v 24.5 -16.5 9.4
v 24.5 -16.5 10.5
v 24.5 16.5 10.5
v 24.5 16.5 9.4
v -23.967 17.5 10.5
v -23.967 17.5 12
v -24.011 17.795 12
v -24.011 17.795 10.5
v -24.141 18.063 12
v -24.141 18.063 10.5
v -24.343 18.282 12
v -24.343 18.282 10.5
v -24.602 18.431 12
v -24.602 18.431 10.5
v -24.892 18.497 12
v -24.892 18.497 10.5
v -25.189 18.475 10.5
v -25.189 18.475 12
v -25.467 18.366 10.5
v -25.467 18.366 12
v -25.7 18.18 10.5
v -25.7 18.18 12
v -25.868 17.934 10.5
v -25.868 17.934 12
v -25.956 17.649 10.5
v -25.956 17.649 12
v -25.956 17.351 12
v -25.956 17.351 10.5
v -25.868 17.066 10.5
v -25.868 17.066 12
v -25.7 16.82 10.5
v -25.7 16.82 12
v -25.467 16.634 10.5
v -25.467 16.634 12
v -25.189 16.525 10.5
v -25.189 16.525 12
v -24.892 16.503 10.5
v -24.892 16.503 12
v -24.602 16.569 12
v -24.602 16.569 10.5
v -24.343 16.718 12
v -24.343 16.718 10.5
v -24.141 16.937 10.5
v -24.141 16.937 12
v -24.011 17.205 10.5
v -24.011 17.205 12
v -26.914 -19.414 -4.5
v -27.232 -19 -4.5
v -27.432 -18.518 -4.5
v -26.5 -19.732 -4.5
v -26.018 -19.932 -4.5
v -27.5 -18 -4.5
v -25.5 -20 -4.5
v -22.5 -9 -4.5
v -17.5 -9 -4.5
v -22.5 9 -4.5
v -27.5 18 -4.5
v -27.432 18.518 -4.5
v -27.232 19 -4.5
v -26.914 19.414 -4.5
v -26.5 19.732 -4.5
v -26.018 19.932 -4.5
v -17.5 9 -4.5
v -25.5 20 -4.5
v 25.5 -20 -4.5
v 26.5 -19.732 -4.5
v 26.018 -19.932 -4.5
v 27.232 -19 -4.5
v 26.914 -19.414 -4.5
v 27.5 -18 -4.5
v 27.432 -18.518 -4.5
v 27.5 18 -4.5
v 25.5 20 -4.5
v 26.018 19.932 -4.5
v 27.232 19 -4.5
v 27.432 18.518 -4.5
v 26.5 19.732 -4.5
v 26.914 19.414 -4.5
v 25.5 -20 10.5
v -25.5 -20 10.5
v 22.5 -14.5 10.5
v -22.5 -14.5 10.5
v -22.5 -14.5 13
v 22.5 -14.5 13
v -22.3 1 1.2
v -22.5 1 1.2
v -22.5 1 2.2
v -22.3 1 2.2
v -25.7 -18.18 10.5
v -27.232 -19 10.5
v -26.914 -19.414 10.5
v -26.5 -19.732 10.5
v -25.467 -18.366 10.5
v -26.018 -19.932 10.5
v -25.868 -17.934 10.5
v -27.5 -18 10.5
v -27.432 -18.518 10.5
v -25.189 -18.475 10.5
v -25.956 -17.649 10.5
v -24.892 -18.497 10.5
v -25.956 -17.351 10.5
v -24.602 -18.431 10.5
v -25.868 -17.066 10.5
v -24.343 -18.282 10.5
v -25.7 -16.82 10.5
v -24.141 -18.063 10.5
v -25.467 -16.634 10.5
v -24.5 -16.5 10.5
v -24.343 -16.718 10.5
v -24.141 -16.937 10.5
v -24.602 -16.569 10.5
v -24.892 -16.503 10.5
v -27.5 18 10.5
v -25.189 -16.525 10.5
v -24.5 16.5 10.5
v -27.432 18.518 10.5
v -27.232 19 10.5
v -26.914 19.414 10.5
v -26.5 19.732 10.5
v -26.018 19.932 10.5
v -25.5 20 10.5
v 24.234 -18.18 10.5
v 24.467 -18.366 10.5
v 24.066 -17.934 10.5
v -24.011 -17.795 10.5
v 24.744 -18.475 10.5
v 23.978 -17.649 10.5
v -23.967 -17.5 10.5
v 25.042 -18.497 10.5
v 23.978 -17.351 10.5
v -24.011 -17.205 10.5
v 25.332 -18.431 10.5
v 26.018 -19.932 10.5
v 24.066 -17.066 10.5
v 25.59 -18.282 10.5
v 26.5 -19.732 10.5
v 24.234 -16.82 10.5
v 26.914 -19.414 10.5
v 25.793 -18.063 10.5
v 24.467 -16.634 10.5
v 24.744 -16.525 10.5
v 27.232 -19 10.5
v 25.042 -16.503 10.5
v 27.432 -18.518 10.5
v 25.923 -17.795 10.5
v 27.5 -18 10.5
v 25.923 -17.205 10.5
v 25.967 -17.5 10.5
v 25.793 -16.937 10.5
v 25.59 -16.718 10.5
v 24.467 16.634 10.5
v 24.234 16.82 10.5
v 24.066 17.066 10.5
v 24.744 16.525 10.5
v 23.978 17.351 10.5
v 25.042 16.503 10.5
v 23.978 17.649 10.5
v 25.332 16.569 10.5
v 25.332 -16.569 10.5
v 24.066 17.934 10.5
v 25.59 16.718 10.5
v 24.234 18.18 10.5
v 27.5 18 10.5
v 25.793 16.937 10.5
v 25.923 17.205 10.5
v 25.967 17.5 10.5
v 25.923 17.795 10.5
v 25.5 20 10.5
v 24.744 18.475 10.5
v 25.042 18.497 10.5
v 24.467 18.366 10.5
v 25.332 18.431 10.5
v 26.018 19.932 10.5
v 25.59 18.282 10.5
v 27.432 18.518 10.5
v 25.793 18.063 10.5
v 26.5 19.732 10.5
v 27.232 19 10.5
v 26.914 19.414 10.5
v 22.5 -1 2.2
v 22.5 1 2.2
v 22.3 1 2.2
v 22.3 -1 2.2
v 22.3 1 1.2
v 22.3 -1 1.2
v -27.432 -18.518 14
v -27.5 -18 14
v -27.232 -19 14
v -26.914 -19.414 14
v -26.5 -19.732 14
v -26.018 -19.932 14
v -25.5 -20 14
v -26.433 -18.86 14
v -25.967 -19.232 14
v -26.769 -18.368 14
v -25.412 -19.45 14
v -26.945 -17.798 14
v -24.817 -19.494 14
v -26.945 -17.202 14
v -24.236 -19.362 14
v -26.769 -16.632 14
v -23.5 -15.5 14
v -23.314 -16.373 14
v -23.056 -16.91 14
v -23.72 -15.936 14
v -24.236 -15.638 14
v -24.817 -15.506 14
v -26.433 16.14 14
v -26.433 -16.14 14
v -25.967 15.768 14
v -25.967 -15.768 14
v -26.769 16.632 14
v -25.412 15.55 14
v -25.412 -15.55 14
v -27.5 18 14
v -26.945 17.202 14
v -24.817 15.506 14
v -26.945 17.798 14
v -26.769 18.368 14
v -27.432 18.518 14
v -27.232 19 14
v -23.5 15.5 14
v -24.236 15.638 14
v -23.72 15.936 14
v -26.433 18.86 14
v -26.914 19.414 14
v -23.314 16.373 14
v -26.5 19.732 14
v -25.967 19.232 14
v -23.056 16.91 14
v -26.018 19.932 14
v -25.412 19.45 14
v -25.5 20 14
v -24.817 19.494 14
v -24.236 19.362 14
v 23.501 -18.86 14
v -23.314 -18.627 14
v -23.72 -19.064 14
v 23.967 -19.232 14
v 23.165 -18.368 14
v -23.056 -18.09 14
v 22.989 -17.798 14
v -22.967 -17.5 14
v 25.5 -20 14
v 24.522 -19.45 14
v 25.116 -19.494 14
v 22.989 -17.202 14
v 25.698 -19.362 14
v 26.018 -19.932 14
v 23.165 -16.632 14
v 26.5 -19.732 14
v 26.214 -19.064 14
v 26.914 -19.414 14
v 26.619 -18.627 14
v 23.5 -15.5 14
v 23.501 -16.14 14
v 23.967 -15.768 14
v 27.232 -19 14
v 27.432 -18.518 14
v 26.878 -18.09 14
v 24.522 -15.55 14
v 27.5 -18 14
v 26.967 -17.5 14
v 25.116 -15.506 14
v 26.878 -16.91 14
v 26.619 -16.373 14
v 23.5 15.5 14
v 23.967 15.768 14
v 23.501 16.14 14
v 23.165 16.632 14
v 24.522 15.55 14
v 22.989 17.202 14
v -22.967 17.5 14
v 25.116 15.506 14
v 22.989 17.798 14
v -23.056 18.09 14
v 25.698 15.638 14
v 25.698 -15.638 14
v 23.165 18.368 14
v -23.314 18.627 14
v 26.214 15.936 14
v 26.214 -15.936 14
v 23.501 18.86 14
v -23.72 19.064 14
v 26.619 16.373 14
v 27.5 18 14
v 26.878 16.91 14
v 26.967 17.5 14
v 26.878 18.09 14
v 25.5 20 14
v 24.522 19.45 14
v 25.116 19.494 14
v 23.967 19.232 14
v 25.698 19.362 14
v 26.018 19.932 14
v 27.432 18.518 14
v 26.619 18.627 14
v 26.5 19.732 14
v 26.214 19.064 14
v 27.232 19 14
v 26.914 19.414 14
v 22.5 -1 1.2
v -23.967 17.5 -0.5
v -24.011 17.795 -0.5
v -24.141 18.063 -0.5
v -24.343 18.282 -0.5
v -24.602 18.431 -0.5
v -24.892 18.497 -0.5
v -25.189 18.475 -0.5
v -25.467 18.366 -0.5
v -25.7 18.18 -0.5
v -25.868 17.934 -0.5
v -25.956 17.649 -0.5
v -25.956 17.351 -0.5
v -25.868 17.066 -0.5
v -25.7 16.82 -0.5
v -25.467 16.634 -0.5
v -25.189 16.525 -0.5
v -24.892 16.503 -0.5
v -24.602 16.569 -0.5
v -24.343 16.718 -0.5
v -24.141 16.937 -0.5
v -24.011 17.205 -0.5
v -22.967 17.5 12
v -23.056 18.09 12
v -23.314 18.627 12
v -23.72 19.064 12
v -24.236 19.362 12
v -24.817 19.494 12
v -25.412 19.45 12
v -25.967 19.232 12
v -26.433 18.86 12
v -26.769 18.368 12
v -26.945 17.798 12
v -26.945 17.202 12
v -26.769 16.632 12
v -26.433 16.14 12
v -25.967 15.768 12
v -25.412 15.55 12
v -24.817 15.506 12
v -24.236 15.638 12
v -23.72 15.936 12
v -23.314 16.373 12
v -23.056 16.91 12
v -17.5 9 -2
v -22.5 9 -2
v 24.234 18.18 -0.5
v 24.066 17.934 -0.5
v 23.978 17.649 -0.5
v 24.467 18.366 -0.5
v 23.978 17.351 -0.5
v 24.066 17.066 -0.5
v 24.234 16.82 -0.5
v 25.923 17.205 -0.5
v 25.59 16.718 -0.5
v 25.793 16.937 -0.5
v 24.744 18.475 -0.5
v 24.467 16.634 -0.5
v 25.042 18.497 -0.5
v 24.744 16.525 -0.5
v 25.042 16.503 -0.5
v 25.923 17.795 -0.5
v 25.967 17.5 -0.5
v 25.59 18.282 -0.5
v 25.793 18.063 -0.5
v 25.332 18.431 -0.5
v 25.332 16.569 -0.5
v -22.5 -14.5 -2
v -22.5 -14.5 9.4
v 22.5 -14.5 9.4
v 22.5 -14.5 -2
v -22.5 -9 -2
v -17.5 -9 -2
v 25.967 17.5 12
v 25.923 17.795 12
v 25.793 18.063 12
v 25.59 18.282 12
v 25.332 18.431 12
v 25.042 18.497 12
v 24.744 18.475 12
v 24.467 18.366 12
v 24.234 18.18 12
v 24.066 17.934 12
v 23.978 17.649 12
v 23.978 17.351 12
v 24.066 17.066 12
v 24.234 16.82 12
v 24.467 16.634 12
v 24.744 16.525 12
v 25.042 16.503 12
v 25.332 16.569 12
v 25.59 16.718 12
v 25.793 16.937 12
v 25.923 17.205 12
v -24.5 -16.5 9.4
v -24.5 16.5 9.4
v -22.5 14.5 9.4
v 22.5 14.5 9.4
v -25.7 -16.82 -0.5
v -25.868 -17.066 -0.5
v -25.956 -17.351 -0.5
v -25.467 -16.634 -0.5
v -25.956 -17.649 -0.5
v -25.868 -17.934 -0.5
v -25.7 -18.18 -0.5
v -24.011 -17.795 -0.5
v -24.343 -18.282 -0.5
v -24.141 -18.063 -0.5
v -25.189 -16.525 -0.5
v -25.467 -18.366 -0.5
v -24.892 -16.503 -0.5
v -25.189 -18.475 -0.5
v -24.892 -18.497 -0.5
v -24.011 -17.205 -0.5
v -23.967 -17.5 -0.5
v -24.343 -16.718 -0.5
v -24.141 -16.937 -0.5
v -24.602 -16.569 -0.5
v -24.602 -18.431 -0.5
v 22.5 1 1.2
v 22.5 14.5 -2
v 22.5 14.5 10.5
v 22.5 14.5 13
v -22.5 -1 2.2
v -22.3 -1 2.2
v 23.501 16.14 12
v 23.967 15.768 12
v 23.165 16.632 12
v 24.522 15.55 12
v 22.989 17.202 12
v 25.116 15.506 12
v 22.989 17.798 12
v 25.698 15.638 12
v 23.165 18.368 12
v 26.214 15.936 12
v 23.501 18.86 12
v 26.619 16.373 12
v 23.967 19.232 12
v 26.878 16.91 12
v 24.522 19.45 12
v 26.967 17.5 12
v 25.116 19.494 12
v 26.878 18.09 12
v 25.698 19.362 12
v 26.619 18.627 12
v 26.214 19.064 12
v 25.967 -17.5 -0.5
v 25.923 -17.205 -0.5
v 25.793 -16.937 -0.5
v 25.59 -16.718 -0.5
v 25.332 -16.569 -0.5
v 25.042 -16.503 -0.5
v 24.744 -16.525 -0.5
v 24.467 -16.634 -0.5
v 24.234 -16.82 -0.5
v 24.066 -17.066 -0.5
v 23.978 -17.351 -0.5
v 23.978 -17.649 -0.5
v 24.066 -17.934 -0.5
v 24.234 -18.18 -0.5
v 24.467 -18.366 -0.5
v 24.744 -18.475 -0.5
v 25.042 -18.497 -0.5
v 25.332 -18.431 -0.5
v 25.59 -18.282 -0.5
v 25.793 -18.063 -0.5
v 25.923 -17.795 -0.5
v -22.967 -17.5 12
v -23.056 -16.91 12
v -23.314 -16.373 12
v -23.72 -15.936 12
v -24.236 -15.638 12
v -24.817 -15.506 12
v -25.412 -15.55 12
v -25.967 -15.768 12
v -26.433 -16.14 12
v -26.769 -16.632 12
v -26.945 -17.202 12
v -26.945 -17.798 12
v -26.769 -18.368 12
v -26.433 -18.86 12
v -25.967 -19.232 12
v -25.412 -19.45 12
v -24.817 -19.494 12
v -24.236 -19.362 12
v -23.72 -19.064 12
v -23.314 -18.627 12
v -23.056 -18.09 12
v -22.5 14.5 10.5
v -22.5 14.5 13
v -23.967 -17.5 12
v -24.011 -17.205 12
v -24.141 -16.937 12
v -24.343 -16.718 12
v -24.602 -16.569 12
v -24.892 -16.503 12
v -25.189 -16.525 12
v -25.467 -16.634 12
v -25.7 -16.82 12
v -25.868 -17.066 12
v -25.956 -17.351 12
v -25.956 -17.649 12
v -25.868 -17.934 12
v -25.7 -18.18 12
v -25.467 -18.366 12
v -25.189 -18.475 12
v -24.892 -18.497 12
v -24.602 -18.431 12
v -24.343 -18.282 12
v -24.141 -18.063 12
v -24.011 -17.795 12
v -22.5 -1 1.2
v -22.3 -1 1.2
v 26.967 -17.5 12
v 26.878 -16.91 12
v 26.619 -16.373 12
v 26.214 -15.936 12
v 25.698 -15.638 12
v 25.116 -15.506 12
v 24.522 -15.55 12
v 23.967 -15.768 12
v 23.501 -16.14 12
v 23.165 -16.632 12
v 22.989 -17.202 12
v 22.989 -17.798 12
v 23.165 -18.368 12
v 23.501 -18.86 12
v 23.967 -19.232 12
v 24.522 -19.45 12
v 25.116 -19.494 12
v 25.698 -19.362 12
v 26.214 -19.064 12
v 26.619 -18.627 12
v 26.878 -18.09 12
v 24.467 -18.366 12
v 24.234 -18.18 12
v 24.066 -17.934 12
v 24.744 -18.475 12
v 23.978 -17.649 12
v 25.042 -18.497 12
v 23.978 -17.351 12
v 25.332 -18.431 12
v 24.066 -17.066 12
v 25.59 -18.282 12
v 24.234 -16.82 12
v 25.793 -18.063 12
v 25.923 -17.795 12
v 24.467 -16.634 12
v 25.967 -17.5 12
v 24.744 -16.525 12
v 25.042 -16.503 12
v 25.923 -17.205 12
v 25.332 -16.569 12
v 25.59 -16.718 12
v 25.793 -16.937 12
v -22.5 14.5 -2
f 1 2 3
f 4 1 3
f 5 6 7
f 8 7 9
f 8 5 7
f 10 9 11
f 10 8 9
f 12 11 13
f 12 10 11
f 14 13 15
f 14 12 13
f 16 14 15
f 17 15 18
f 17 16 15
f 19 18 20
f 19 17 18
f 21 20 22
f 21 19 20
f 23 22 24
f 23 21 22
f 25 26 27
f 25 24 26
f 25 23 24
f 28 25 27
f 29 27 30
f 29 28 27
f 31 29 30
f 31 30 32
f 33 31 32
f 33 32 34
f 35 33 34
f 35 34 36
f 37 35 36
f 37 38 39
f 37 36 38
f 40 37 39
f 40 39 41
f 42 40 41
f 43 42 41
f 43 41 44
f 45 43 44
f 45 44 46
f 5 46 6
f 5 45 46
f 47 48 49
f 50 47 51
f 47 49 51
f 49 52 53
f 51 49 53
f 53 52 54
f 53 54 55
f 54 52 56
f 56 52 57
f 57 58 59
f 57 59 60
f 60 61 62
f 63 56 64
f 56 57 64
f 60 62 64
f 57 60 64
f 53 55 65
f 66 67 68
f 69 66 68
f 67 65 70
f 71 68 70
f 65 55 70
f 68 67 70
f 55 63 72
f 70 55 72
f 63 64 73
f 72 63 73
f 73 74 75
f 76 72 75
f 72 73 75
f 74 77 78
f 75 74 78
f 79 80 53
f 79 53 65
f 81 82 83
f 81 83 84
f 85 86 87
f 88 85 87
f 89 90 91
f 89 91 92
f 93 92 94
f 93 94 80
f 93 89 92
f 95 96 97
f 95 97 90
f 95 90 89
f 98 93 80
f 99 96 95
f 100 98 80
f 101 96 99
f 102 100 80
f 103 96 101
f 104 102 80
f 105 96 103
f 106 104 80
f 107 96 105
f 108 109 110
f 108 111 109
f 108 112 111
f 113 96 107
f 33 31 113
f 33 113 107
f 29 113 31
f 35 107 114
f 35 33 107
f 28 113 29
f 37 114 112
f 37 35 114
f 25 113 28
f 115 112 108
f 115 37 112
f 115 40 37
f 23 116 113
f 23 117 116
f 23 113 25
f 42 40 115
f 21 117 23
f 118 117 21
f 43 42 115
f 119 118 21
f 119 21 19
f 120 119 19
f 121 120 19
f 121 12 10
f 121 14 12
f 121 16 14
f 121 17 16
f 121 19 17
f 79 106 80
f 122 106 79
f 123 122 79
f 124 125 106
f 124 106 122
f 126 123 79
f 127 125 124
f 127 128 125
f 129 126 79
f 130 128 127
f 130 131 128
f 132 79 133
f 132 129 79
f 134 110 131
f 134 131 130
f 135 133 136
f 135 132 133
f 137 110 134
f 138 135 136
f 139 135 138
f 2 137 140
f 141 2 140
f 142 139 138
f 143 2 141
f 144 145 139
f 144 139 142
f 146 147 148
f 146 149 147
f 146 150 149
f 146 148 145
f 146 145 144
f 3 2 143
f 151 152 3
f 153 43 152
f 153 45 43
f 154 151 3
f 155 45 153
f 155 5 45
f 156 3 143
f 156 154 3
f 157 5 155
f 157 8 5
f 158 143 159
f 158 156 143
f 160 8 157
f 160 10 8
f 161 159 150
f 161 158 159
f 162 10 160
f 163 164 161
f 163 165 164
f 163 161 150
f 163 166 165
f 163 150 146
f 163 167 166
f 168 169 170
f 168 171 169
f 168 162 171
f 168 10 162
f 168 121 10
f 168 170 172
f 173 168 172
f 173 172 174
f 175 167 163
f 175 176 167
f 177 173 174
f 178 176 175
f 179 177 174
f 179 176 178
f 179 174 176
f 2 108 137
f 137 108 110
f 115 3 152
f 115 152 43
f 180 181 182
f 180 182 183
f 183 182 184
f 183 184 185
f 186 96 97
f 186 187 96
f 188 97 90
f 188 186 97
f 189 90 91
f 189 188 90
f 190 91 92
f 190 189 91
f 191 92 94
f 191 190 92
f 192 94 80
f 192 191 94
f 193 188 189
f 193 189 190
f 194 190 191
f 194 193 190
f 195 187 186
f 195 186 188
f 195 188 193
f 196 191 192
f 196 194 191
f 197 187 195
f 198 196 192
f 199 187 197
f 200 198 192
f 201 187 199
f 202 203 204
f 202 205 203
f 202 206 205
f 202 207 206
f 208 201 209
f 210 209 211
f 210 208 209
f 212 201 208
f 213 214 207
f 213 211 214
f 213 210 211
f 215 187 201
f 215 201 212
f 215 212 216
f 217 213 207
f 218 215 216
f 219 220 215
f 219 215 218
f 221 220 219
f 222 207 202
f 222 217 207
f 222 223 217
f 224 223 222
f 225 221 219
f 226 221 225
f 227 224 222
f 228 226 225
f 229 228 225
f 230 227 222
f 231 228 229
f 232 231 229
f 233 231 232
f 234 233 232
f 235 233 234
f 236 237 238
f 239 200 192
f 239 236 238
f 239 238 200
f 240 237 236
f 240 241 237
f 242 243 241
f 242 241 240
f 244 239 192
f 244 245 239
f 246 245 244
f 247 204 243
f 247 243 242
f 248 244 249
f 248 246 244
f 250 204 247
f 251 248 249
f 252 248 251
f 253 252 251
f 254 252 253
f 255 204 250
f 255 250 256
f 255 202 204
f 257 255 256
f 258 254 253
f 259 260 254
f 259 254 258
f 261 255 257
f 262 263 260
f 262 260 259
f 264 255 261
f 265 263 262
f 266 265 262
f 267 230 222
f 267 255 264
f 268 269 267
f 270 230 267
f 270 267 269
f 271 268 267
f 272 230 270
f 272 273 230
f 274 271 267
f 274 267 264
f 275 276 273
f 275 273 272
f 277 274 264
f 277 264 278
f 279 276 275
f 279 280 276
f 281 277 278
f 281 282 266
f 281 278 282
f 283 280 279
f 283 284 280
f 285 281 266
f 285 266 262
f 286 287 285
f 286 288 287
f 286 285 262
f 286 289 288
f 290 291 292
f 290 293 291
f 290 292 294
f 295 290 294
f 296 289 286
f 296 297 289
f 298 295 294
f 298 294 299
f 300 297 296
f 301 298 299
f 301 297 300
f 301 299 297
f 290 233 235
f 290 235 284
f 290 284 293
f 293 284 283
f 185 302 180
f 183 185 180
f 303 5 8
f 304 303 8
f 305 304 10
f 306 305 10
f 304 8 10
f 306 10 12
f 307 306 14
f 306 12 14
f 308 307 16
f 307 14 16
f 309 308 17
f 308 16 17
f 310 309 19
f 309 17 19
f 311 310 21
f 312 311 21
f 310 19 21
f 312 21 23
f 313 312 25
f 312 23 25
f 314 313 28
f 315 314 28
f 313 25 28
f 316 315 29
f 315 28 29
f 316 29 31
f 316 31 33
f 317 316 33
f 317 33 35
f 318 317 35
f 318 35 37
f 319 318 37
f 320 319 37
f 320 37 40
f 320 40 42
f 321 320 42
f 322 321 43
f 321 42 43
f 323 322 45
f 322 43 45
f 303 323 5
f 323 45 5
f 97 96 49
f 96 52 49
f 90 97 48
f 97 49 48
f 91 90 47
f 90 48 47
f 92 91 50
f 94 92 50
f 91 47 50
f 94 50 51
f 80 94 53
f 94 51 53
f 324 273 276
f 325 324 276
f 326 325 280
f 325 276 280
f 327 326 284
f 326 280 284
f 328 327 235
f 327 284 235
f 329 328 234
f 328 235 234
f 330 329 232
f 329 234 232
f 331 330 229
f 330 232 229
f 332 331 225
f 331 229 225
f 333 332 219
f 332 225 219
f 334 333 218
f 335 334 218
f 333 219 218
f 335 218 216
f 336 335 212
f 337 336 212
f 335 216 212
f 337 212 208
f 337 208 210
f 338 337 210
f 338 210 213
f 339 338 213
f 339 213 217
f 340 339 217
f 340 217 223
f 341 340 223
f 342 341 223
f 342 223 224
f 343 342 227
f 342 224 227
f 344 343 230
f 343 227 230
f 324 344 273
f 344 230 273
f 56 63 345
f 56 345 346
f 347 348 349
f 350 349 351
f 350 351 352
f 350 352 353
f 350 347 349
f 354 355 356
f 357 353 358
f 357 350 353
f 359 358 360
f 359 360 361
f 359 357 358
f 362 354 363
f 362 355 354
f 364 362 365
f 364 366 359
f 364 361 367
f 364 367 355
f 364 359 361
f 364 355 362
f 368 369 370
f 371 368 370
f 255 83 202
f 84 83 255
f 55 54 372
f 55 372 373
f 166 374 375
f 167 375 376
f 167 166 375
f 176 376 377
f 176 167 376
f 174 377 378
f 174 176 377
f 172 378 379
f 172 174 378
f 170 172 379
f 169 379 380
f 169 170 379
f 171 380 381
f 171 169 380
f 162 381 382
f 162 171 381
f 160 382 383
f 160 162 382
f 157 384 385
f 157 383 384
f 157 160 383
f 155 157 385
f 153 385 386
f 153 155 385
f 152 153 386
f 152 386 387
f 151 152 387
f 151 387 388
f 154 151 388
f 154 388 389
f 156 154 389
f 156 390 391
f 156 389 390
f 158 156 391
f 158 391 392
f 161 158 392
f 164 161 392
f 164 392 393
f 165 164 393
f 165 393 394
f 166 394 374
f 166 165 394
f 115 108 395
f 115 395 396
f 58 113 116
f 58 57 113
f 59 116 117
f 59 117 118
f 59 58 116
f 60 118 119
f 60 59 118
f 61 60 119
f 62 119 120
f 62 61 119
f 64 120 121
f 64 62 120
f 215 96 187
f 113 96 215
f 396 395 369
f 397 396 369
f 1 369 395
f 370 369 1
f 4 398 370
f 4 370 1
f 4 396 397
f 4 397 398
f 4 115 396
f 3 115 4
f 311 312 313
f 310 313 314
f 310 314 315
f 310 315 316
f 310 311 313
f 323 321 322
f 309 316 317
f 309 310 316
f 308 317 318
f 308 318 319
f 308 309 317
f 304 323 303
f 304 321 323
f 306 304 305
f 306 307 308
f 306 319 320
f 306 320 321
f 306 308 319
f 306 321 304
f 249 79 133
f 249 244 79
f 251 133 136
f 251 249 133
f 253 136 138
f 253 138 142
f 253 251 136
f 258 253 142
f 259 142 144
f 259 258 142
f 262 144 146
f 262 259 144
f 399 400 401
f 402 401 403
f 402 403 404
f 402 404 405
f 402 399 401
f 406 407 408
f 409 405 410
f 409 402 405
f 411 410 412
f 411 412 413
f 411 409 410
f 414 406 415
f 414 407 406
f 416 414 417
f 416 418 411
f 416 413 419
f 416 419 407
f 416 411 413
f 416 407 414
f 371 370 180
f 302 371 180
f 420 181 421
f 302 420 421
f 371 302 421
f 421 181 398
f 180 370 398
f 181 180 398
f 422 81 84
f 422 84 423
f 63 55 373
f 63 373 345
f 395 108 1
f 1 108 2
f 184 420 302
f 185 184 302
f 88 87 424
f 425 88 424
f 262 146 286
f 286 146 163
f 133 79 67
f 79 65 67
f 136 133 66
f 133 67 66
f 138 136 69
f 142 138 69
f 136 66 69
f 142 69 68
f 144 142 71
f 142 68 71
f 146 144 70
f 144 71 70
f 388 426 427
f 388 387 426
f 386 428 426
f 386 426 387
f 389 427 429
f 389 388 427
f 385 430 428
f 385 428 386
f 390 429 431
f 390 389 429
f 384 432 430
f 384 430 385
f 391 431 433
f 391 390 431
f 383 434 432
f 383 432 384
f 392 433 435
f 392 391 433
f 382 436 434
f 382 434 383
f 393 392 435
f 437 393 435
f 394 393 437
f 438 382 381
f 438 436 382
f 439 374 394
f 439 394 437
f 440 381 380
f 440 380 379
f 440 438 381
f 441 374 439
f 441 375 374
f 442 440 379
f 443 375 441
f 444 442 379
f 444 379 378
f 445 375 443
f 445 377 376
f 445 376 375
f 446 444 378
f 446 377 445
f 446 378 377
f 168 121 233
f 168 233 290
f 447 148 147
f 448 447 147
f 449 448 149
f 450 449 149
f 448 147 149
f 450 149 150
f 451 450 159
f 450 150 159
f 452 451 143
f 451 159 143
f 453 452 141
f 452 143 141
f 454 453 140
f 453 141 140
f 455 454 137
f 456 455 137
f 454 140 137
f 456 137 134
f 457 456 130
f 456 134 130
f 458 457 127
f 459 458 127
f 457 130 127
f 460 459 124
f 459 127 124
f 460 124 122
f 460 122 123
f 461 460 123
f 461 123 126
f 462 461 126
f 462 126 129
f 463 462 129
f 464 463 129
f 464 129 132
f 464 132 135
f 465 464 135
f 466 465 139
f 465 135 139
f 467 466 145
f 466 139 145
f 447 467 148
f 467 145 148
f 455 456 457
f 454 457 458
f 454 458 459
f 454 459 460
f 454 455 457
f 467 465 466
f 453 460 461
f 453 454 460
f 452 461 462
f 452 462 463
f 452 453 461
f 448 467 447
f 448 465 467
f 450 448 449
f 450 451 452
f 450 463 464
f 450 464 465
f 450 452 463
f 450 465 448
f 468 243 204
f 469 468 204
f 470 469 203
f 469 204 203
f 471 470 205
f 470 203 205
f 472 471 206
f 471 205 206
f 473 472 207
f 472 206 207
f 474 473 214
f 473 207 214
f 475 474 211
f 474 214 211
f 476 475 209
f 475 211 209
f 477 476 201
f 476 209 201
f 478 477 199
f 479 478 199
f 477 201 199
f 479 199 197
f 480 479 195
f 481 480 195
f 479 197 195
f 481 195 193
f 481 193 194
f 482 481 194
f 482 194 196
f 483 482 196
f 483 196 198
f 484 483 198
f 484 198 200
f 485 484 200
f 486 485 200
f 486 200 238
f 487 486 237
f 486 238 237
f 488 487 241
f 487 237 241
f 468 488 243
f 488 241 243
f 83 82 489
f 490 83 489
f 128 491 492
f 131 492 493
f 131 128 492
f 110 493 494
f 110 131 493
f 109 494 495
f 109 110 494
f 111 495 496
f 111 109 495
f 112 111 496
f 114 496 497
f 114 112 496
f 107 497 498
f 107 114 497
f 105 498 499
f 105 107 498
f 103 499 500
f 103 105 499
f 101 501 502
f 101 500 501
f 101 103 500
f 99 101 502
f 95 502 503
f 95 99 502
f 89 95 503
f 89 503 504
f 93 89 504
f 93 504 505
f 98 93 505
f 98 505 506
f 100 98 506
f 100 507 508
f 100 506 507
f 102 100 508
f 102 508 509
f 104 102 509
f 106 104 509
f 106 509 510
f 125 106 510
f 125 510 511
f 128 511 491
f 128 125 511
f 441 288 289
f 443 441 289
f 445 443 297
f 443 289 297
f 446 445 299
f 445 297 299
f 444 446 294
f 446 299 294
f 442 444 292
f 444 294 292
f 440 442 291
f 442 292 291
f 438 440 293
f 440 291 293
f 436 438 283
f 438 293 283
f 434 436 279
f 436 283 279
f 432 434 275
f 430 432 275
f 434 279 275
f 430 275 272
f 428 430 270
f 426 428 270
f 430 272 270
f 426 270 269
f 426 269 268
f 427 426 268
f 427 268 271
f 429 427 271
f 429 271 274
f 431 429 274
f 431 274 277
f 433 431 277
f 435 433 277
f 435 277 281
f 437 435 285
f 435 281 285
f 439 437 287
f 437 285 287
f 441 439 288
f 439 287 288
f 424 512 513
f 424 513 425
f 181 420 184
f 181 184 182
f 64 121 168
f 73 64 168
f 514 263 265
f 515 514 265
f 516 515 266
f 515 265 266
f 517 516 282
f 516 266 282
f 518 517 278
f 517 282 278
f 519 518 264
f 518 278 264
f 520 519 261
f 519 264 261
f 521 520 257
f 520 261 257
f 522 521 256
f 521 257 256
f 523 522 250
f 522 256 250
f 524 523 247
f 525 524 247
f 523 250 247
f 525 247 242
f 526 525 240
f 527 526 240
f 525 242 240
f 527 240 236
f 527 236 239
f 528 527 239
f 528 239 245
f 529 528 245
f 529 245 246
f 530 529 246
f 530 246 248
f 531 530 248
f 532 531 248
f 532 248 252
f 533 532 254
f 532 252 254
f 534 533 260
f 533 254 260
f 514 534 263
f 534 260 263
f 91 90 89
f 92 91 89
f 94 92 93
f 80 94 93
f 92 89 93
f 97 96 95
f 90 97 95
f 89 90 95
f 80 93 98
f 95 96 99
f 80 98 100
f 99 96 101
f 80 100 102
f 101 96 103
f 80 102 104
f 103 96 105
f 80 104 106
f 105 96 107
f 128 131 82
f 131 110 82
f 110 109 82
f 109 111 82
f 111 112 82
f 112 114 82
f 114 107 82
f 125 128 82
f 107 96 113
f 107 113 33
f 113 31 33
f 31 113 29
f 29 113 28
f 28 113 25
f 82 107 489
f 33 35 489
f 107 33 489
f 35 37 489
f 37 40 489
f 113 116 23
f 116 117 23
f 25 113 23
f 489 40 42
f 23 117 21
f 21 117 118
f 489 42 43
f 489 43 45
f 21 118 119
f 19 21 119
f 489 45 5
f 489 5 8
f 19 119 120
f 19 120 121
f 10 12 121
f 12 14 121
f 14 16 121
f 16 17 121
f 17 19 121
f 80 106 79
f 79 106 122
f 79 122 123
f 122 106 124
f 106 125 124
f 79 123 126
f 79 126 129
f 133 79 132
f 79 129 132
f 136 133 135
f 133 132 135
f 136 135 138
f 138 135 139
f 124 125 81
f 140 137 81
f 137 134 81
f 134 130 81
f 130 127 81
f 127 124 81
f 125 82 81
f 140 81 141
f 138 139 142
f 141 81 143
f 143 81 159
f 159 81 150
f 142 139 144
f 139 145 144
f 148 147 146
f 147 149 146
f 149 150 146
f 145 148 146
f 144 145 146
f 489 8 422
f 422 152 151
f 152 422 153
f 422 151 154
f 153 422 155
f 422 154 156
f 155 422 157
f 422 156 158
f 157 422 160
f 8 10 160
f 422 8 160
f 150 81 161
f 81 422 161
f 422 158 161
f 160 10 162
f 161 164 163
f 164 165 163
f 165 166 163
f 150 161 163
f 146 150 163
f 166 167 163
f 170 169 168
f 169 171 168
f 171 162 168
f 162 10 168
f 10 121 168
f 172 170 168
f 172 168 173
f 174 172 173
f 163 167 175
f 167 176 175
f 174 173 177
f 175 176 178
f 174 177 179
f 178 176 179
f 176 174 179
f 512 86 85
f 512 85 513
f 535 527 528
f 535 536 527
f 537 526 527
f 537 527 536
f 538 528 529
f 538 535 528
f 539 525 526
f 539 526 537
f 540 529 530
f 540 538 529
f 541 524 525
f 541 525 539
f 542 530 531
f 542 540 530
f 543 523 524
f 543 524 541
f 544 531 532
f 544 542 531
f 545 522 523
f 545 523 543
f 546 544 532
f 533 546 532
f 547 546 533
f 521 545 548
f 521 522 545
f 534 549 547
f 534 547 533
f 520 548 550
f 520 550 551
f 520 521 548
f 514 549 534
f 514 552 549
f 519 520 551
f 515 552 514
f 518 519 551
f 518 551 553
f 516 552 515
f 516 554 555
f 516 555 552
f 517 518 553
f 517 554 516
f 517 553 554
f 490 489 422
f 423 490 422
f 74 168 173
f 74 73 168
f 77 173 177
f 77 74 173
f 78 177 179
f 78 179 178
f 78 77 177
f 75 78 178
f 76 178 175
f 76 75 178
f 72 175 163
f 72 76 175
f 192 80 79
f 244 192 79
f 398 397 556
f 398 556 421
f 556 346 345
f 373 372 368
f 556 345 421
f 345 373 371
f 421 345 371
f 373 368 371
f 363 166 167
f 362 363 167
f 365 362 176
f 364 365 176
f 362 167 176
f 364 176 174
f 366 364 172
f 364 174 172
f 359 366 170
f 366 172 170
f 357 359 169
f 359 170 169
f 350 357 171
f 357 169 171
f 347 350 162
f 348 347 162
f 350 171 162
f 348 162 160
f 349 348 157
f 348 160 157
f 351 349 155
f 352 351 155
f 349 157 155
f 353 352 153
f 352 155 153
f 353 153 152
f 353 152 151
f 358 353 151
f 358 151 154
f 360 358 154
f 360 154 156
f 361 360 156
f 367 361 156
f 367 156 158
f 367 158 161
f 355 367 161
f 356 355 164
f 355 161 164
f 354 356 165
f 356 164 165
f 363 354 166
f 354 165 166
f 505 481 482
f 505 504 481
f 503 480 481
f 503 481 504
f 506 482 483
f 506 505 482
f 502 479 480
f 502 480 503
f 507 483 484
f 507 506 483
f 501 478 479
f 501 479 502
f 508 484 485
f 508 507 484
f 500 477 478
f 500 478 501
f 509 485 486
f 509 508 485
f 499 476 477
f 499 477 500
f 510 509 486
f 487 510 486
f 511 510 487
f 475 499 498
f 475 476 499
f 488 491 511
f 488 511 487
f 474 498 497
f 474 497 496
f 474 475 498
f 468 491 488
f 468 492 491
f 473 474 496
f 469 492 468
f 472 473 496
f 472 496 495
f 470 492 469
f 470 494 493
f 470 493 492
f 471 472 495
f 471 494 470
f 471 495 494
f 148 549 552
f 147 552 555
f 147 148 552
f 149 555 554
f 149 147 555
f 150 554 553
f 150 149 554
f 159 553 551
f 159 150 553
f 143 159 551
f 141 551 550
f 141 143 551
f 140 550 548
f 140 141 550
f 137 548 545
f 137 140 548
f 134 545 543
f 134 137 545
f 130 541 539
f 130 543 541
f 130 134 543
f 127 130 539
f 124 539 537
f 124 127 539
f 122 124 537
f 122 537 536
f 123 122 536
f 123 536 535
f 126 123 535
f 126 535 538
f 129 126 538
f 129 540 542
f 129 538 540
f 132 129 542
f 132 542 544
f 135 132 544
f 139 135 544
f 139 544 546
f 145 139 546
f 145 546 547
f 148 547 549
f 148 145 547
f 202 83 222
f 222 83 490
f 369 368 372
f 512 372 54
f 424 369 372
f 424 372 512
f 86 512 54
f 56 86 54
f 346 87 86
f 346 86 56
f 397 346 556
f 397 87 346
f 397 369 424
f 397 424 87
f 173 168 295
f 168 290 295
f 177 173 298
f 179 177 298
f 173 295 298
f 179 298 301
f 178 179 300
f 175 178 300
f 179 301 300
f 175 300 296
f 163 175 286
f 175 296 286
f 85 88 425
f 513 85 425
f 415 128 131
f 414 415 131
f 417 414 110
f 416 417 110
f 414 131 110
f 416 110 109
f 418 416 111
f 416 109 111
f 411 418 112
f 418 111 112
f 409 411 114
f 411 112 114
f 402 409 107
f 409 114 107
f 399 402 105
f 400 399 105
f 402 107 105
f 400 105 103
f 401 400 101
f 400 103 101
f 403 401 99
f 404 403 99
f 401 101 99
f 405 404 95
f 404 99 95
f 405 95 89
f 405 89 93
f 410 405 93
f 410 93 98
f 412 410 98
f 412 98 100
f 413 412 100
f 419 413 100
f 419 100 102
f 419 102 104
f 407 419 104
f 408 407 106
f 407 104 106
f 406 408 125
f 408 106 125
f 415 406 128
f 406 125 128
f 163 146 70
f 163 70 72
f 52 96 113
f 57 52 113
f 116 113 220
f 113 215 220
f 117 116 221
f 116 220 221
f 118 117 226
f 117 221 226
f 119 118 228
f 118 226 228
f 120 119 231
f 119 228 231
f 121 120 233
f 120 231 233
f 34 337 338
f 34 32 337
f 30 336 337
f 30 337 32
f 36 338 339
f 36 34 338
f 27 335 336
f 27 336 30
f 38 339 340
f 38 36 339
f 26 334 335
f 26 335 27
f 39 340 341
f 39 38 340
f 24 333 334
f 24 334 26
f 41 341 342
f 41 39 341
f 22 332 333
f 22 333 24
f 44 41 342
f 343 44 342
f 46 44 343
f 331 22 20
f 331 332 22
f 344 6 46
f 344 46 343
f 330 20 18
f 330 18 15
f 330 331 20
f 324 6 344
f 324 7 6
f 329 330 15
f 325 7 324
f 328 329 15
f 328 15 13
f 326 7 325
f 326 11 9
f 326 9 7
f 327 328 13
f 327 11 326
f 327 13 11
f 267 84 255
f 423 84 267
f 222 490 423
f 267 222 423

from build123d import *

# Parameters (mm, degrees)
F0_W      = 45
F0_H      = 29
F1_DEPTH  = 5.7
F2_W      = 34.1
F2_H      = 25.7
F3_DEPTH  = 7.8
F4_DEPTH  = 6
F6_DEPTH  = 4
F8_W      = 55
F8_H      = 40
F9_DEPTH  = 20
F11_W     = 45
F11_H     = 29
F12_DEPTH = 9.8
F13_W     = 2
F13_H     = 1
F14_DEPTH = 0.2
F16_DEPTH = 5
F17_W     = 49
F17_H     = 33
F17_W_2   = 45
F17_H_2   = 29
F18_DEPTH = 1.1
F19_R     = 1
F20_DEPTH = 11
F21_W     = 55
F21_H     = 40
F21_R     = 1
F21_W_2   = 45
F21_H_2   = 29
F22_DEPTH = 3.5
F23_R     = 2
F24_DEPTH = 2
F25_R     = 2
F25_2_R   = 2
F26_SIZE  = 1


with BuildPart() as f1:
    # F0 (on Top) → F1 (new body)
    with BuildSketch(Plane.XY):
        Rectangle(F0_W, F0_H)
    extrude(amount=F1_DEPTH)

    # F2 (on face) → F3 (join)
    with BuildSketch(Plane.XY.offset(5.7)):
        Rectangle(F2_W, F2_H)
    extrude(amount=F3_DEPTH)

    # F4 (add): a face of the model
    f4_faces = [f1.faces().sort_by_distance(p)[0] for p in [
        (0, 0, 0),
    ]]
    extrude(f4_faces, amount=F4_DEPTH)

    # F5 (on face) → F6 (cut)
    with BuildSketch(Plane(origin=(0, 0, -6), x_dir=(1, 0, 0), z_dir=(0, 0, -1))):
        Polygon((-22.5, 9), (-17.5, 9), (-17.5, -9), (-22.5, -9), (-22.5, -14.5), (22.5, -14.5), (22.5, 14.5), (-22.5, 14.5), align=None)
    extrude(amount=-F6_DEPTH, mode=Mode.SUBTRACT)


with BuildPart() as f9:
    # F8 (on offset) → F9 (new body)
    with BuildSketch(Plane.XY.offset(15.5)):
        Rectangle(F8_W, F8_H)
    extrude(amount=-F9_DEPTH)

    # F10: cut F1
    add(f1.part, mode=Mode.SUBTRACT)

    # F11 (on face) → F12 (cut, through all)
    with BuildSketch(Plane.XY.offset(15.5)):
        Rectangle(F11_W, F11_H)
    extrude(amount=-F12_DEPTH, mode=Mode.SUBTRACT)



with BuildPart() as f14:
    # F13 (on face) → F14 (new body)
    with BuildSketch(Plane(origin=(22.5, 0, 0), x_dir=(0, -1, 0), z_dir=(-1, 0, 0))):
        with Locations((0, 1.7)):
            Rectangle(F13_W, F13_H)
    extrude(amount=F14_DEPTH)


with BuildPart() as f9_1:
    add(f9.part)

    add(f14.part)  # F15 merges F14
    # F15: F14 across plane
    add(f14.part.mirror(Plane.YZ))

    # F8 (on offset) → F16 (cut)
    with BuildSketch(Plane.XY.offset(15.5)):
        Rectangle(F8_W, F8_H)
    extrude(amount=-F16_DEPTH, mode=Mode.SUBTRACT)

    # F17 (on face) → F18 (cut)
    with BuildSketch(Plane.XY.offset(10.5)):
        Rectangle(F17_W, F17_H)
        Rectangle(F17_W_2, F17_H_2, mode=Mode.SUBTRACT)
    extrude(amount=-F18_DEPTH, mode=Mode.SUBTRACT)

    # F19 (on face) → F20 (cut)
    with BuildSketch(Plane.XY.offset(10.5)):
        with Locations((-24.9669570476, -17.5)):
            Circle(F19_R)
        with Locations((-24.9669570476, 17.5)):
            Circle(F19_R)
        with Locations((24.9669570476, -17.5)):
            Circle(F19_R)
        with Locations((24.9669570476, 17.5)):
            Circle(F19_R)
    extrude(amount=-F20_DEPTH, mode=Mode.SUBTRACT)

    # F25
    f25_edges = [f9_1.edges().sort_by_distance(p)[0] for p in [
        (-27.5, 20, 3),
        (-27.5, -20, 3),
        (27.5, -20, 3),
        (27.5, 20, 3),
    ]]
    fillet(f25_edges, radius=F25_R)


with BuildPart() as f22:
    # F21 (on face) → F22 (new body)
    with BuildSketch(Plane.XY.offset(10.5)):
        Rectangle(F21_W, F21_H)
        with Locations((-24.9669570476, -17.5)):
            Circle(F21_R, mode=Mode.SUBTRACT)
        with Locations((24.9669570476, -17.5)):
            Circle(F21_R, mode=Mode.SUBTRACT)
        with Locations((-24.9669570476, 17.5)):
            Circle(F21_R, mode=Mode.SUBTRACT)
        Rectangle(F21_W_2, F21_H_2, mode=Mode.SUBTRACT)
        with Locations((24.9669570476, 17.5)):
            Circle(F21_R, mode=Mode.SUBTRACT)
    extrude(amount=F22_DEPTH)

    # F23 (on face) → F24 (cut)
    with BuildSketch(Plane.XY.offset(14)):
        with Locations((24.9669570476, 17.5)):
            Circle(F23_R)
        with Locations((24.9669570476, -17.5)):
            Circle(F23_R)
        with Locations((-24.9669570476, 17.5)):
            Circle(F23_R)
        with Locations((-24.9669570476, -17.5)):
            Circle(F23_R)
    extrude(amount=-F24_DEPTH, mode=Mode.SUBTRACT)

    # F25#2
    f25_2_edges = [f22.edges().sort_by_distance(p)[0] for p in [
        (-27.5, 20, 12.25),
        (-27.5, -20, 12.25),
        (27.5, -20, 12.25),
        (27.5, 20, 12.25),
    ]]
    fillet(f25_2_edges, radius=F25_2_R)

    # F26
    f26_edges = [f22.edges().sort_by_distance(p)[0] for p in [
        (0, -14.5, 14),
        (22.5, 0, 14),
        (0, 14.5, 14),
        (-22.5, 0, 14),
    ]]
    chamfer(f26_edges, length=F26_SIZE)


solid = Compound([f9_1.part, f22.part])
